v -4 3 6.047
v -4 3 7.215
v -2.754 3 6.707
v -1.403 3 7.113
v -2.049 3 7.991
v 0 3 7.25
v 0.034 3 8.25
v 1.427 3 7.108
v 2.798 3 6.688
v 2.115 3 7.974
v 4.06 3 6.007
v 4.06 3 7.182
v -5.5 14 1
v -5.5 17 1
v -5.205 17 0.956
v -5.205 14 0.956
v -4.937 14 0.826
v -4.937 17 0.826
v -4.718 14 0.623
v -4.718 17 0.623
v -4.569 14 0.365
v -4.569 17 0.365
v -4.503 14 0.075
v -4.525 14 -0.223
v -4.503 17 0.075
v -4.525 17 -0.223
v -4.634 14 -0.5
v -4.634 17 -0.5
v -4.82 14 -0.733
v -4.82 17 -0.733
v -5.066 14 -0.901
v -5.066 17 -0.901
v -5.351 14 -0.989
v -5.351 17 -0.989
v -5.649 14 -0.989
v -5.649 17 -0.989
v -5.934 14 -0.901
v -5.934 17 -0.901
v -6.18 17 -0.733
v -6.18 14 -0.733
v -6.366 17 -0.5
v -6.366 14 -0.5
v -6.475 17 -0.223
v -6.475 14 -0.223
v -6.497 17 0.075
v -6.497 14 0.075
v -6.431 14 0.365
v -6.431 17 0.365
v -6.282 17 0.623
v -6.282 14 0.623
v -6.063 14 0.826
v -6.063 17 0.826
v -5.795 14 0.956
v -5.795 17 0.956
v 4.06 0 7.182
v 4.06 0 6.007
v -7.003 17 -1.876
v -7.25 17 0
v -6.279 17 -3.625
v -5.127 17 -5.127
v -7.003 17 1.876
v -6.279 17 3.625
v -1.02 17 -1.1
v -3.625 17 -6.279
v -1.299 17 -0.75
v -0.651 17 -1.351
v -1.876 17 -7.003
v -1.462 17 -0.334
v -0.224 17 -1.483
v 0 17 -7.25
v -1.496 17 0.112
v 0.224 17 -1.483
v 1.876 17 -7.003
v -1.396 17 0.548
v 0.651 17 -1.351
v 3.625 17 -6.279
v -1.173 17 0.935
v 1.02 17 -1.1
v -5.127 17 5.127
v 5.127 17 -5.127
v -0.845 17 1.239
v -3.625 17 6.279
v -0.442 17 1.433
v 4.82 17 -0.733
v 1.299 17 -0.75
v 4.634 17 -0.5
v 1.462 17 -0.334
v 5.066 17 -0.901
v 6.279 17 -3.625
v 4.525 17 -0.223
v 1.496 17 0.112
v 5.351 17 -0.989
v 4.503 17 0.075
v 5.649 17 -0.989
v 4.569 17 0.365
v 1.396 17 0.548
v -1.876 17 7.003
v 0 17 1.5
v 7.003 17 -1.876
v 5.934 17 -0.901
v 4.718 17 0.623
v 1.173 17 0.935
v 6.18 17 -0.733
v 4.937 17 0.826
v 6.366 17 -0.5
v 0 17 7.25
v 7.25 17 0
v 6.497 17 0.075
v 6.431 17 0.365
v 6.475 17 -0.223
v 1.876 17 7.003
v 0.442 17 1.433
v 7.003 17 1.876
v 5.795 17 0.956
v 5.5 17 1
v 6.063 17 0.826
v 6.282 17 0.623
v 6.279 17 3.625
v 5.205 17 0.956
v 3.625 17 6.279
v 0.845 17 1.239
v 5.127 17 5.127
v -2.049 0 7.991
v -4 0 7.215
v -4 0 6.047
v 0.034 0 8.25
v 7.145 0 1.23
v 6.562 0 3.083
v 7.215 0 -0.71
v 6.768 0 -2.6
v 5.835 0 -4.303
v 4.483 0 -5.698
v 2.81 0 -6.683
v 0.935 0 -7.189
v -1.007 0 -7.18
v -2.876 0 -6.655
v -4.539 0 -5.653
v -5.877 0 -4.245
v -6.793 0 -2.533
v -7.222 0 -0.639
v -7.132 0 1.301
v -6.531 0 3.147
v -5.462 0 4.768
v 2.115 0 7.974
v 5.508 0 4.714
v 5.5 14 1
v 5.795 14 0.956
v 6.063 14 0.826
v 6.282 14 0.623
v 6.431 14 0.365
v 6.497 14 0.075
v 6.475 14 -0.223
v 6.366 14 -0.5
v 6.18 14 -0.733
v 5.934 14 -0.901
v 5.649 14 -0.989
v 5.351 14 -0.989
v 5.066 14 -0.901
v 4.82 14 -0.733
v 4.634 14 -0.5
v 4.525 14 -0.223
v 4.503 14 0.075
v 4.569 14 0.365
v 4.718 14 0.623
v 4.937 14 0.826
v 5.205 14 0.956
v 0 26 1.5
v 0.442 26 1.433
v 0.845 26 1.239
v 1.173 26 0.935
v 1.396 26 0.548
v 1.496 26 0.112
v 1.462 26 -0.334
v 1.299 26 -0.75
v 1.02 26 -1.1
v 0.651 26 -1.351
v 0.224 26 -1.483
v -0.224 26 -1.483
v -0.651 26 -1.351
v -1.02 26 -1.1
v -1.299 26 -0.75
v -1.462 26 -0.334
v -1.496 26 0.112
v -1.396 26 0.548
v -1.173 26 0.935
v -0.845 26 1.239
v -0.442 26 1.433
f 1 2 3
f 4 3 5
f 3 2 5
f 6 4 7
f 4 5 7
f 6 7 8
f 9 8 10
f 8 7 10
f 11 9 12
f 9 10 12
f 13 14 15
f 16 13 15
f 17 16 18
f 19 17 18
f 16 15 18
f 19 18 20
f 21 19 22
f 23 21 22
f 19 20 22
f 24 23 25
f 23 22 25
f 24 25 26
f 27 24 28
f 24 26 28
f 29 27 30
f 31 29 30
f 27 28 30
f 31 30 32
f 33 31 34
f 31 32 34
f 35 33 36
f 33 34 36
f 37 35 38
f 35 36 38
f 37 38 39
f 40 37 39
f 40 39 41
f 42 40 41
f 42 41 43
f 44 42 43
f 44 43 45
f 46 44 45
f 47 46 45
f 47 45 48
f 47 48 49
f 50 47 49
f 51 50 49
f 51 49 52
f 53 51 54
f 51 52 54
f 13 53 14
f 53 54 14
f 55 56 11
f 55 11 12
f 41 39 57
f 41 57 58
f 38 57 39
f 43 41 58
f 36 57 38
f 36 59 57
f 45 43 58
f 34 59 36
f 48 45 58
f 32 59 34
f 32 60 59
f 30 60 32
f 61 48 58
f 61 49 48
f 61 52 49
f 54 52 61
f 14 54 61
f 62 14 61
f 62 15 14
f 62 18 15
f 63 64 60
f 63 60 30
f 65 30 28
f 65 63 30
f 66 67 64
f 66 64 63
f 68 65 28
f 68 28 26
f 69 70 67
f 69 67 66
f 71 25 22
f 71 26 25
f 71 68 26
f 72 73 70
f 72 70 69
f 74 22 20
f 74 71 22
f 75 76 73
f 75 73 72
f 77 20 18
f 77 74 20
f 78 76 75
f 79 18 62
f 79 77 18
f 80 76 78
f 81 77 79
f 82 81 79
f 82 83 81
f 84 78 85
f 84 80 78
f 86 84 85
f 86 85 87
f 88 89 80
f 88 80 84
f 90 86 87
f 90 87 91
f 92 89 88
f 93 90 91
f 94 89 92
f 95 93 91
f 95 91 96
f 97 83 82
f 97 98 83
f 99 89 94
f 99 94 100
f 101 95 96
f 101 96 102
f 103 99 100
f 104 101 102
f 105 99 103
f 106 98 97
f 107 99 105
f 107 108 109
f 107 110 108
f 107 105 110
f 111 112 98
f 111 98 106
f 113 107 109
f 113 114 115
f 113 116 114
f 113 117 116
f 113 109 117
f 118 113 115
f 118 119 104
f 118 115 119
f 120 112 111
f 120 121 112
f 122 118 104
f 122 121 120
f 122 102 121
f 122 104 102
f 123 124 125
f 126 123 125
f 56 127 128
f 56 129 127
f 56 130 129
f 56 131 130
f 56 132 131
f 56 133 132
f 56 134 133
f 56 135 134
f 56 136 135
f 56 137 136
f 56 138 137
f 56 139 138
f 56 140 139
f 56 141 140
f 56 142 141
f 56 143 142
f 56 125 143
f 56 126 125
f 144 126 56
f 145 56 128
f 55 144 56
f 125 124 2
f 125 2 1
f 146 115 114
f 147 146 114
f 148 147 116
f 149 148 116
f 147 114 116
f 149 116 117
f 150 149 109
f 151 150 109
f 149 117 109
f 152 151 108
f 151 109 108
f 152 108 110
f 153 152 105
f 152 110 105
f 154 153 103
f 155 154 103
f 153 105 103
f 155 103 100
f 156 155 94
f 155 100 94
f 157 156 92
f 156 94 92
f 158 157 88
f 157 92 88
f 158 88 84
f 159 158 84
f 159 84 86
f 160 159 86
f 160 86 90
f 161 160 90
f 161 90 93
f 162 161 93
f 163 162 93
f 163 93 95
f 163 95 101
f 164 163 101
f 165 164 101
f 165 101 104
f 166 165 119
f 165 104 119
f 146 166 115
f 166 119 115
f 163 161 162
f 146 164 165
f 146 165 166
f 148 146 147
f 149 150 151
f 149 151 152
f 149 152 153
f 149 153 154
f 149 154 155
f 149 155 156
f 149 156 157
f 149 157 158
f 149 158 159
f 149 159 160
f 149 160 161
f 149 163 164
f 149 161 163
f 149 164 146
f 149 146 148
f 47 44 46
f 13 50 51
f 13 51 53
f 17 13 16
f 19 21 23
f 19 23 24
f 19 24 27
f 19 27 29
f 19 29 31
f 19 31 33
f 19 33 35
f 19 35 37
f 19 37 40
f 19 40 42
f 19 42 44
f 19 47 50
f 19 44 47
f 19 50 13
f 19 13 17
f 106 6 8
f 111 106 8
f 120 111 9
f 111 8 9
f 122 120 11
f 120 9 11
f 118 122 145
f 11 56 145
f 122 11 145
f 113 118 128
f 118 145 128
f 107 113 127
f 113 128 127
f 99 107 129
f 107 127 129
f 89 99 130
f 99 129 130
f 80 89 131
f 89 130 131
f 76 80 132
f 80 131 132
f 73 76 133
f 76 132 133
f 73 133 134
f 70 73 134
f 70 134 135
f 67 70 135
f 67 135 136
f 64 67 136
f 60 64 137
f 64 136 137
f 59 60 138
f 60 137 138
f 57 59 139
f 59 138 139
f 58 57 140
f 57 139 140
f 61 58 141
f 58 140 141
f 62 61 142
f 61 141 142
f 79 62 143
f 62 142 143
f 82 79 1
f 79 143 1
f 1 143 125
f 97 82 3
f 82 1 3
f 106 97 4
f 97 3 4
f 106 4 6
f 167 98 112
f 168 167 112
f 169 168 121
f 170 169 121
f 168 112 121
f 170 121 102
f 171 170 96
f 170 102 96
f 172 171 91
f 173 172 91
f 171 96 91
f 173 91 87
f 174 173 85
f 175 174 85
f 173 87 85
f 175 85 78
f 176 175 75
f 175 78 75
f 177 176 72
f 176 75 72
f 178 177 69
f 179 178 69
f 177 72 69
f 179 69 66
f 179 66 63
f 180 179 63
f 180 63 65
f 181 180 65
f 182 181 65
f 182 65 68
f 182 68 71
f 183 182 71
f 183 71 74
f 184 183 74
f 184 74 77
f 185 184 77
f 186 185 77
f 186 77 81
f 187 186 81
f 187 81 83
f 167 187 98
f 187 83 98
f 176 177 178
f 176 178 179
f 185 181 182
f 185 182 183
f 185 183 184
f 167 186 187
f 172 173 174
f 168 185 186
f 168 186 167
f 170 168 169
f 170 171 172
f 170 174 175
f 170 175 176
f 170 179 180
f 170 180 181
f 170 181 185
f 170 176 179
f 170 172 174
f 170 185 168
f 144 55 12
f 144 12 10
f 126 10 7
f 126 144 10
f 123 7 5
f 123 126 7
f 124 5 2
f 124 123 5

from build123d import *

# Parameters (mm, degrees)
SKETCH_1_R          = 7.25
EXTRUDE_1_DEPTH     = 17
SKETCH_2_R          = 1.5
EXTRUDE_2_DEPTH     = 9
EXTRUDE_3_DEPTH     = 3
SKETCH_4_R          = 1
CUT_EXTRUDE_1_DEPTH = 3


with BuildPart() as part:
    # 草图1 → 凸台-拉伸1 (new body)
    with BuildSketch(Plane(origin=(0, 0, 0), x_dir=(1, 0, 0), z_dir=(0, 1, 0))):
        with Locations(Location((0, 0, 0), (0, 0, 270))):
            Circle(SKETCH_1_R)
    extrude(amount=EXTRUDE_1_DEPTH)

    # 草图2 → 凸台-拉伸2 (add)
    with BuildSketch(Plane(origin=(0, 17, 0), x_dir=(1, 0, 0), z_dir=(0, 1, 0))):
        with Locations(Location((0, 0, 0), (0, 0, 270))):
            Circle(SKETCH_2_R)
    extrude(amount=EXTRUDE_2_DEPTH)

    # 草图3 → 凸台-拉伸3 (add)
    with BuildSketch(Plane.XZ):
        with BuildLine():
            Line((-4, 7.215434845), (-4, 6.006791496))
            Line((-4, 6.006791496), (4.059674361, 6.006791496))
            Line((4.059674361, 6.006791496), (4.059674361, 7.182029245))
            ThreePointArc((4.059674361, 7.182029245), (0.034194164, 8.249929137), (-4, 7.215434845))
        make_face()
    extrude(amount=-EXTRUDE_3_DEPTH)

    # 草图4 → 切除-拉伸1 (cut)
    with BuildSketch(Plane(origin=(0, 17, 0), x_dir=(1, 0, 0), z_dir=(0, 1, 0))):
        with Locations(Location((5.5, 0, 0), (0, 0, 270))):
            Circle(SKETCH_4_R)
        with Locations(Location((-5.5, 0, 0), (0, 0, 270))):
            Circle(SKETCH_4_R)
    extrude(amount=-CUT_EXTRUDE_1_DEPTH, mode=Mode.SUBTRACT)


solid = part.part
